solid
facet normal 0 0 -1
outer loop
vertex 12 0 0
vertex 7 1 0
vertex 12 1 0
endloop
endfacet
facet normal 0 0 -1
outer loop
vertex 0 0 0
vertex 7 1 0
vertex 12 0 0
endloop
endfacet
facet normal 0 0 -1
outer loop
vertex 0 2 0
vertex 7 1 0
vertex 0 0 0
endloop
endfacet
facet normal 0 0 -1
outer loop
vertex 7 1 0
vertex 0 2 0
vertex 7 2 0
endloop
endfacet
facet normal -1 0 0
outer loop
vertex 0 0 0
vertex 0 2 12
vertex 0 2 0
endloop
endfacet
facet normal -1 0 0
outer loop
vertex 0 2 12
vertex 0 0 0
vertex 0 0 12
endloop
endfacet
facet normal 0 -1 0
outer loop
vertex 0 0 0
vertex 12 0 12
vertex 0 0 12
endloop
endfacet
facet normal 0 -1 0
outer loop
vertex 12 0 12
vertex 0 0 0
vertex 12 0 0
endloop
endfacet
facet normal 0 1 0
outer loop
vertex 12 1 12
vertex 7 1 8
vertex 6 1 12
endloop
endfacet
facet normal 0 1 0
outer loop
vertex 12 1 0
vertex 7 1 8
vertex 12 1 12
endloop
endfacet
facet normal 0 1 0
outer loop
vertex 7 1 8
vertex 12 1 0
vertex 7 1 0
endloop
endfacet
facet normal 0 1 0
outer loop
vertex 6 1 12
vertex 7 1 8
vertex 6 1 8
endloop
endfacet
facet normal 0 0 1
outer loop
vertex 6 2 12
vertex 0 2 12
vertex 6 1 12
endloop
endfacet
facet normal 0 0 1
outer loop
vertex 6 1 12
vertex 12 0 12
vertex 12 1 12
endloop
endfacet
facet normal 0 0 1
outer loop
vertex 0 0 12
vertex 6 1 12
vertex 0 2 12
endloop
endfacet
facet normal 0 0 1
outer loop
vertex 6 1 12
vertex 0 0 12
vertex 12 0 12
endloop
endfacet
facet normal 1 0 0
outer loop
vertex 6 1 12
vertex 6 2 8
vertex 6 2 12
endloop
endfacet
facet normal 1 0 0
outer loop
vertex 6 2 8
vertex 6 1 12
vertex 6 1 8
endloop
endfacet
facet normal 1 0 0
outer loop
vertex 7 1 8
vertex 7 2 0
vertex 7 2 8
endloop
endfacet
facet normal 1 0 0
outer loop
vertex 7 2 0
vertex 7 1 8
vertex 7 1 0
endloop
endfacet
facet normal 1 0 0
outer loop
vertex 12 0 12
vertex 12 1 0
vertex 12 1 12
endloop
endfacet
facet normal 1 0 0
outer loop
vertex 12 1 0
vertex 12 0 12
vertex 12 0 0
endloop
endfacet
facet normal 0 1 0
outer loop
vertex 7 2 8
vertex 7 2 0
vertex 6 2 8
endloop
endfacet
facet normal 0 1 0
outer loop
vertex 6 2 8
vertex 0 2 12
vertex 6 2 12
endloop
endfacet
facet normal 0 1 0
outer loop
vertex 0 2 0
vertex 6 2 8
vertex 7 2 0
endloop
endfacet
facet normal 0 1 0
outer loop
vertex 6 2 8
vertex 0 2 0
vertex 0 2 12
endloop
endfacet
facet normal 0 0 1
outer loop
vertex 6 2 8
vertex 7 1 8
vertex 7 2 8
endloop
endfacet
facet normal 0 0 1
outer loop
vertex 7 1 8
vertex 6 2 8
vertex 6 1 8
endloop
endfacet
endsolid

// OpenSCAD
union() {
    translate([0, 0, 0]) cube([1, 1, 1]);
    translate([0, 0, 1]) cube([1, 1, 1]);
    translate([0, 0, 2]) cube([1, 1, 1]);
    translate([0, 0, 3]) cube([1, 1, 1]);
    translate([0, 0, 4]) cube([1, 1, 1]);
    translate([0, 0, 5]) cube([1, 1, 1]);
    translate([0, 0, 6]) cube([1, 1, 1]);
    translate([0, 0, 7]) cube([1, 1, 1]);
    translate([0, 0, 8]) cube([1, 1, 1]);
    translate([0, 0, 9]) cube([1, 1, 1]);
    translate([0, 0, 10]) cube([1, 1, 1]);
    translate([0, 0, 11]) cube([1, 1, 1]);
    translate([1, 0, 0]) cube([1, 1, 1]);
    translate([1, 0, 1]) cube([1, 1, 1]);
    translate([1, 0, 2]) cube([1, 1, 1]);
    translate([1, 0, 3]) cube([1, 1, 1]);
    translate([1, 0, 4]) cube([1, 1, 1]);
    translate([1, 0, 5]) cube([1, 1, 1]);
    translate([1, 0, 6]) cube([1, 1, 1]);
    translate([1, 0, 7]) cube([1, 1, 1]);
    translate([1, 0, 8]) cube([1, 1, 1]);
    translate([1, 0, 9]) cube([1, 1, 1]);
    translate([1, 0, 10]) cube([1, 1, 1]);
    translate([1, 0, 11]) cube([1, 1, 1]);
    translate([2, 0, 0]) cube([1, 1, 1]);
    translate([2, 0, 1]) cube([1, 1, 1]);
    translate([2, 0, 2]) cube([1, 1, 1]);
    translate([2, 0, 3]) cube([1, 1, 1]);
    translate([2, 0, 4]) cube([1, 1, 1]);
    translate([2, 0, 5]) cube([1, 1, 1]);
    translate([2, 0, 6]) cube([1, 1, 1]);
    translate([2, 0, 7]) cube([1, 1, 1]);
    translate([2, 0, 8]) cube([1, 1, 1]);
    translate([2, 0, 9]) cube([1, 1, 1]);
    translate([2, 0, 10]) cube([1, 1, 1]);
    translate([2, 0, 11]) cube([1, 1, 1]);
    translate([3, 0, 0]) cube([1, 1, 1]);
    translate([3, 0, 1]) cube([1, 1, 1]);
    translate([3, 0, 2]) cube([1, 1, 1]);
    translate([3, 0, 3]) cube([1, 1, 1]);
    translate([3, 0, 4]) cube([1, 1, 1]);
    translate([3, 0, 5]) cube([1, 1, 1]);
    translate([3, 0, 6]) cube([1, 1, 1]);
    translate([3, 0, 7]) cube([1, 1, 1]);
    translate([3, 0, 8]) cube([1, 1, 1]);
    translate([3, 0, 9]) cube([1, 1, 1]);
    translate([3, 0, 10]) cube([1, 1, 1]);
    translate([3, 0, 11]) cube([1, 1, 1]);
    translate([4, 0, 0]) cube([1, 1, 1]);
    translate([4, 0, 1]) cube([1, 1, 1]);
    translate([4, 0, 2]) cube([1, 1, 1]);
    translate([4, 0, 3]) cube([1, 1, 1]);
    translate([4, 0, 4]) cube([1, 1, 1]);
    translate([4, 0, 5]) cube([1, 1, 1]);
    translate([4, 0, 6]) cube([1, 1, 1]);
    translate([4, 0, 7]) cube([1, 1, 1]);
    translate([4, 0, 8]) cube([1, 1, 1]);
    translate([4, 0, 9]) cube([1, 1, 1]);
    translate([4, 0, 10]) cube([1, 1, 1]);
    translate([4, 0, 11]) cube([1, 1, 1]);
    translate([5, 0, 0]) cube([1, 1, 1]);
    translate([5, 0, 1]) cube([1, 1, 1]);
    translate([5, 0, 2]) cube([1, 1, 1]);
    translate([5, 0, 3]) cube([1, 1, 1]);
    translate([5, 0, 4]) cube([1, 1, 1]);
    translate([5, 0, 5]) cube([1, 1, 1]);
    translate([5, 0, 6]) cube([1, 1, 1]);
    translate([5, 0, 7]) cube([1, 1, 1]);
    translate([5, 0, 8]) cube([1, 1, 1]);
    translate([5, 0, 9]) cube([1, 1, 1]);
    translate([5, 0, 10]) cube([1, 1, 1]);
    translate([5, 0, 11]) cube([1, 1, 1]);
    translate([6, 0, 0]) cube([1, 1, 1]);
    translate([6, 0, 1]) cube([1, 1, 1]);
    translate([6, 0, 2]) cube([1, 1, 1]);
    translate([6, 0, 3]) cube([1, 1, 1]);
    translate([6, 0, 4]) cube([1, 1, 1]);
    translate([6, 0, 5]) cube([1, 1, 1]);
    translate([6, 0, 6]) cube([1, 1, 1]);
    translate([6, 0, 7]) cube([1, 1, 1]);
    translate([6, 0, 8]) cube([1, 1, 1]);
    translate([6, 0, 9]) cube([1, 1, 1]);
    translate([6, 0, 10]) cube([1, 1, 1]);
    translate([6, 0, 11]) cube([1, 1, 1]);
    translate([7, 0, 0]) cube([1, 1, 1]);
    translate([7, 0, 1]) cube([1, 1, 1]);
    translate([7, 0, 2]) cube([1, 1, 1]);
    translate([7, 0, 3]) cube([1, 1, 1]);
    translate([7, 0, 4]) cube([1, 1, 1]);
    translate([7, 0, 5]) cube([1, 1, 1]);
    translate([7, 0, 6]) cube([1, 1, 1]);
    translate([7, 0, 7]) cube([1, 1, 1]);
    translate([7, 0, 8]) cube([1, 1, 1]);
    translate([7, 0, 9]) cube([1, 1, 1]);
    translate([7, 0, 10]) cube([1, 1, 1]);
    translate([7, 0, 11]) cube([1, 1, 1]);
    translate([8, 0, 0]) cube([1, 1, 1]);
    translate([8, 0, 1]) cube([1, 1, 1]);
    translate([8, 0, 2]) cube([1, 1, 1]);
    translate([8, 0, 3]) cube([1, 1, 1]);
    translate([8, 0, 4]) cube([1, 1, 1]);
    translate([8, 0, 5]) cube([1, 1, 1]);
    translate([8, 0, 6]) cube([1, 1, 1]);
    translate([8, 0, 7]) cube([1, 1, 1]);
    translate([8, 0, 8]) cube([1, 1, 1]);
    translate([8, 0, 9]) cube([1, 1, 1]);
    translate([8, 0, 10]) cube([1, 1, 1]);
    translate([8, 0, 11]) cube([1, 1, 1]);
    translate([9, 0, 0]) cube([1, 1, 1]);
    translate([9, 0, 1]) cube([1, 1, 1]);
    translate([9, 0, 2]) cube([1, 1, 1]);
    translate([9, 0, 3]) cube([1, 1, 1]);
    translate([9, 0, 4]) cube([1, 1, 1]);
    translate([9, 0, 5]) cube([1, 1, 1]);
    translate([9, 0, 6]) cube([1, 1, 1]);
    translate([9, 0, 7]) cube([1, 1, 1]);
    translate([9, 0, 8]) cube([1, 1, 1]);
    translate([9, 0, 9]) cube([1, 1, 1]);
    translate([9, 0, 10]) cube([1, 1, 1]);
    translate([9, 0, 11]) cube([1, 1, 1]);
    translate([10, 0, 0]) cube([1, 1, 1]);
    translate([10, 0, 1]) cube([1, 1, 1]);
    translate([10, 0, 2]) cube([1, 1, 1]);
    translate([10, 0, 3]) cube([1, 1, 1]);
    translate([10, 0, 4]) cube([1, 1, 1]);
    translate([10, 0, 5]) cube([1, 1, 1]);
    translate([10, 0, 6]) cube([1, 1, 1]);
    translate([10, 0, 7]) cube([1, 1, 1]);
    translate([10, 0, 8]) cube([1, 1, 1]);
    translate([10, 0, 9]) cube([1, 1, 1]);
    translate([10, 0, 10]) cube([1, 1, 1]);
    translate([10, 0, 11]) cube([1, 1, 1]);
    translate([11, 0, 0]) cube([1, 1, 1]);
    translate([11, 0, 1]) cube([1, 1, 1]);
    translate([11, 0, 2]) cube([1, 1, 1]);
    translate([11, 0, 3]) cube([1, 1, 1]);
    translate([11, 0, 4]) cube([1, 1, 1]);
    translate([11, 0, 5]) cube([1, 1, 1]);
    translate([11, 0, 6]) cube([1, 1, 1]);
    translate([11, 0, 7]) cube([1, 1, 1]);
    translate([11, 0, 8]) cube([1, 1, 1]);
    translate([11, 0, 9]) cube([1, 1, 1]);
    translate([11, 0, 10]) cube([1, 1, 1]);
    translate([11, 0, 11]) cube([1, 1, 1]);
    translate([0, 1, 0]) cube([1, 1, 1]);
    translate([0, 1, 1]) cube([1, 1, 1]);
    translate([0, 1, 2]) cube([1, 1, 1]);
    translate([0, 1, 3]) cube([1, 1, 1]);
    translate([0, 1, 4]) cube([1, 1, 1]);
    translate([0, 1, 5]) cube([1, 1, 1]);
    translate([0, 1, 6]) cube([1, 1, 1]);
    translate([0, 1, 7]) cube([1, 1, 1]);
    translate([0, 1, 8]) cube([1, 1, 1]);
    translate([0, 1, 9]) cube([1, 1, 1]);
    translate([0, 1, 10]) cube([1, 1, 1]);
    translate([0, 1, 11]) cube([1, 1, 1]);
    translate([1, 1, 0]) cube([1, 1, 1]);
    translate([1, 1, 1]) cube([1, 1, 1]);
    translate([1, 1, 2]) cube([1, 1, 1]);
    translate([1, 1, 3]) cube([1, 1, 1]);
    translate([1, 1, 4]) cube([1, 1, 1]);
    translate([1, 1, 5]) cube([1, 1, 1]);
    translate([1, 1, 6]) cube([1, 1, 1]);
    translate([1, 1, 7]) cube([1, 1, 1]);
    translate([1, 1, 8]) cube([1, 1, 1]);
    translate([1, 1, 9]) cube([1, 1, 1]);
    translate([1, 1, 10]) cube([1, 1, 1]);
    translate([1, 1, 11]) cube([1, 1, 1]);
    translate([2, 1, 0]) cube([1, 1, 1]);
    translate([2, 1, 1]) cube([1, 1, 1]);
    translate([2, 1, 2]) cube([1, 1, 1]);
    translate([2, 1, 3]) cube([1, 1, 1]);
    translate([2, 1, 4]) cube([1, 1, 1]);
    translate([2, 1, 5]) cube([1, 1, 1]);
    translate([2, 1, 6]) cube([1, 1, 1]);
    translate([2, 1, 7]) cube([1, 1, 1]);
    translate([2, 1, 8]) cube([1, 1, 1]);
    translate([2, 1, 9]) cube([1, 1, 1]);
    translate([2, 1, 10]) cube([1, 1, 1]);
    translate([2, 1, 11]) cube([1, 1, 1]);
    translate([3, 1, 0]) cube([1, 1, 1]);
    translate([3, 1, 1]) cube([1, 1, 1]);
    translate([3, 1, 2]) cube([1, 1, 1]);
    translate([3, 1, 3]) cube([1, 1, 1]);
    translate([3, 1, 4]) cube([1, 1, 1]);
    translate([3, 1, 5]) cube([1, 1, 1]);
    translate([3, 1, 6]) cube([1, 1, 1]);
    translate([3, 1, 7]) cube([1, 1, 1]);
    translate([3, 1, 8]) cube([1, 1, 1]);
    translate([3, 1, 9]) cube([1, 1, 1]);
    translate([3, 1, 10]) cube([1, 1, 1]);
    translate([3, 1, 11]) cube([1, 1, 1]);
    translate([4, 1, 0]) cube([1, 1, 1]);
    translate([4, 1, 1]) cube([1, 1, 1]);
    translate([4, 1, 2]) cube([1, 1, 1]);
    translate([4, 1, 3]) cube([1, 1, 1]);
    translate([4, 1, 4]) cube([1, 1, 1]);
    translate([4, 1, 5]) cube([1, 1, 1]);
    translate([4, 1, 6]) cube([1, 1, 1]);
    translate([4, 1, 7]) cube([1, 1, 1]);
    translate([4, 1, 8]) cube([1, 1, 1]);
    translate([4, 1, 9]) cube([1, 1, 1]);
    translate([4, 1, 10]) cube([1, 1, 1]);
    translate([4, 1, 11]) cube([1, 1, 1]);
    translate([5, 1, 0]) cube([1, 1, 1]);
    translate([5, 1, 1]) cube([1, 1, 1]);
    translate([5, 1, 2]) cube([1, 1, 1]);
    translate([5, 1, 3]) cube([1, 1, 1]);
    translate([5, 1, 4]) cube([1, 1, 1]);
    translate([5, 1, 5]) cube([1, 1, 1]);
    translate([5, 1, 6]) cube([1, 1, 1]);
    translate([5, 1, 7]) cube([1, 1, 1]);
    translate([5, 1, 8]) cube([1, 1, 1]);
    translate([5, 1, 9]) cube([1, 1, 1]);
    translate([5, 1, 10]) cube([1, 1, 1]);
    translate([5, 1, 11]) cube([1, 1, 1]);
    translate([6, 1, 0]) cube([1, 1, 1]);
    translate([6, 1, 1]) cube([1, 1, 1]);
    translate([6, 1, 2]) cube([1, 1, 1]);
    translate([6, 1, 3]) cube([1, 1, 1]);
    translate([6, 1, 4]) cube([1, 1, 1]);
    translate([6, 1, 5]) cube([1, 1, 1]);
    translate([6, 1, 6]) cube([1, 1, 1]);
    translate([6, 1, 7]) cube([1, 1, 1]);
}
